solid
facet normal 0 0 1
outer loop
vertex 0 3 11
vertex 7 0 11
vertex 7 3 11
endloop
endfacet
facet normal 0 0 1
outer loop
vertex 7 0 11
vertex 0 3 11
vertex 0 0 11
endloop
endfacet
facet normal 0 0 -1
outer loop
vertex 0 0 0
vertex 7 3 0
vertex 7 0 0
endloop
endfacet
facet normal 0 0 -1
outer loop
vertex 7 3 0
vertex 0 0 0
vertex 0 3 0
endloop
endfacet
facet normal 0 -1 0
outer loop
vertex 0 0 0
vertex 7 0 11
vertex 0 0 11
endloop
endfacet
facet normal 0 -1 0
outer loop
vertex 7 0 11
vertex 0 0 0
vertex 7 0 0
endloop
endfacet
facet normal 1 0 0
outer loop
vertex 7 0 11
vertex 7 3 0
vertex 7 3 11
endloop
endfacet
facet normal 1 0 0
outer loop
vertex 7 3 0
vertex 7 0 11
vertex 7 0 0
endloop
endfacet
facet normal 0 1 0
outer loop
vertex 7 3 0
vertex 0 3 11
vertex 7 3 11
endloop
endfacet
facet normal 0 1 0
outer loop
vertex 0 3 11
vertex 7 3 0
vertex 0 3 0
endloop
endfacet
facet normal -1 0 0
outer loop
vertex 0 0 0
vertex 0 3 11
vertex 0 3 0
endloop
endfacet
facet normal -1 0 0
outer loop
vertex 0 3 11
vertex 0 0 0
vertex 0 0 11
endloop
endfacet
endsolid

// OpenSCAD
// Generated by SolidPython 1.0.1 on 2020-07-29 00:46:54


cube(size = [7, 3, 11]);
/***********************************************
*********      SolidPython code:      **********
************************************************
 
# import packages: SolidPython
from solid import *
from solid.utils import *
from itertools import chain, combinations, permutations


class Resize:

    def __init__(self, scad_file):
        self.scad_file = scad_file
        #self.scad_file = import_scad(scad_file)
        # cone/cylinder param:
        self.r1 = 0
        self.r2 = 0
        self.h = 0
        # rectangular prism param:
        self.w = 0
        self.l = 0
        # ellipse param:
        self.r = 0

    # import OpenScad code (file name corresponds to shape)


    # classify shape + parameters
    def assign(self, param1, param2, param3):
        if self.scad_file == 'cone.scad':
            self.r1 = param1
            self.r2 = param2
            self.h = param3
        elif self.scad_file == 'cylinder.scad':
            self.r1 = param1
            self.r2 = param2
            self.h = param3
        elif self.scad_file == 'rectangularPrism.scad':
            self.h = param1
            self.l = param2
            self.w = param3
        else:
            self.r = param1
            self.h = param2

    # resize parameters
    def iterate(self):
        x = range(3, 20, 2)
        i = 1
        if self.scad_file == 'cone.scad':
            tempList = list(permutations(x, 2))
            for temp in tempList:
                param1 = temp[0]
                param2 = temp[1]
                filepath = 'produced_scad_files/' + 'cone' + str(param1) + '_' + str(param2) + '_' + '.scad'
                scad_render_to_file(cylinder(h=param1, r1=param2, r2=0), filepath)

        elif self.scad_file == 'cylinder.scad':
            tempList = list(permutations(x, 3))
            for temp in tempList:
                param1 = temp[0]
                param2 = temp[1]
                filepath = 'produced_scad_files/' + 'cylinder' + str(param1) + '_' + str(param2) + '_' + '.scad'
                scad_render_to_file(cylinder(h=param1, r1=param2, r2=param2), filepath)

        elif self.scad_file == 'rectangularPrism.scad':
            tempList = list(permutations(x, 3))
            for temp in tempList:
                param1 = temp[0]
                param2 = temp[1]
                param3 = temp[2]
                filepath = 'produced_scad_files/' + 'rectangularPrism' + str(param1) + '_' + str(param2) + '_' + str(
                    param3) + '.scad'
                scad_render_to_file(cube(size=(param1, param2, param3)), filepath)

        elif self.scad_file == 'ellipse.scad':
            tempList = list(permutations(x, 4))
            for temp in tempList:
                param1 = temp[0]
                param2 = temp[1]
                param3 = temp[2]
                param4 = temp[3]
                filepath = 'produced_scad_files/' + 'ellipse' + str(param1) + '_' + str(param2) + '_' + str(param3) + '_' + str(param4) + '.scad'
                scad_render_to_file(scale([param1, param2, param3])(sphere(r=param4)), filepath)

    def render_to_scadfile(self):
        scad_render_to_file(scad, 'example.scad') 
 
************************************************/
